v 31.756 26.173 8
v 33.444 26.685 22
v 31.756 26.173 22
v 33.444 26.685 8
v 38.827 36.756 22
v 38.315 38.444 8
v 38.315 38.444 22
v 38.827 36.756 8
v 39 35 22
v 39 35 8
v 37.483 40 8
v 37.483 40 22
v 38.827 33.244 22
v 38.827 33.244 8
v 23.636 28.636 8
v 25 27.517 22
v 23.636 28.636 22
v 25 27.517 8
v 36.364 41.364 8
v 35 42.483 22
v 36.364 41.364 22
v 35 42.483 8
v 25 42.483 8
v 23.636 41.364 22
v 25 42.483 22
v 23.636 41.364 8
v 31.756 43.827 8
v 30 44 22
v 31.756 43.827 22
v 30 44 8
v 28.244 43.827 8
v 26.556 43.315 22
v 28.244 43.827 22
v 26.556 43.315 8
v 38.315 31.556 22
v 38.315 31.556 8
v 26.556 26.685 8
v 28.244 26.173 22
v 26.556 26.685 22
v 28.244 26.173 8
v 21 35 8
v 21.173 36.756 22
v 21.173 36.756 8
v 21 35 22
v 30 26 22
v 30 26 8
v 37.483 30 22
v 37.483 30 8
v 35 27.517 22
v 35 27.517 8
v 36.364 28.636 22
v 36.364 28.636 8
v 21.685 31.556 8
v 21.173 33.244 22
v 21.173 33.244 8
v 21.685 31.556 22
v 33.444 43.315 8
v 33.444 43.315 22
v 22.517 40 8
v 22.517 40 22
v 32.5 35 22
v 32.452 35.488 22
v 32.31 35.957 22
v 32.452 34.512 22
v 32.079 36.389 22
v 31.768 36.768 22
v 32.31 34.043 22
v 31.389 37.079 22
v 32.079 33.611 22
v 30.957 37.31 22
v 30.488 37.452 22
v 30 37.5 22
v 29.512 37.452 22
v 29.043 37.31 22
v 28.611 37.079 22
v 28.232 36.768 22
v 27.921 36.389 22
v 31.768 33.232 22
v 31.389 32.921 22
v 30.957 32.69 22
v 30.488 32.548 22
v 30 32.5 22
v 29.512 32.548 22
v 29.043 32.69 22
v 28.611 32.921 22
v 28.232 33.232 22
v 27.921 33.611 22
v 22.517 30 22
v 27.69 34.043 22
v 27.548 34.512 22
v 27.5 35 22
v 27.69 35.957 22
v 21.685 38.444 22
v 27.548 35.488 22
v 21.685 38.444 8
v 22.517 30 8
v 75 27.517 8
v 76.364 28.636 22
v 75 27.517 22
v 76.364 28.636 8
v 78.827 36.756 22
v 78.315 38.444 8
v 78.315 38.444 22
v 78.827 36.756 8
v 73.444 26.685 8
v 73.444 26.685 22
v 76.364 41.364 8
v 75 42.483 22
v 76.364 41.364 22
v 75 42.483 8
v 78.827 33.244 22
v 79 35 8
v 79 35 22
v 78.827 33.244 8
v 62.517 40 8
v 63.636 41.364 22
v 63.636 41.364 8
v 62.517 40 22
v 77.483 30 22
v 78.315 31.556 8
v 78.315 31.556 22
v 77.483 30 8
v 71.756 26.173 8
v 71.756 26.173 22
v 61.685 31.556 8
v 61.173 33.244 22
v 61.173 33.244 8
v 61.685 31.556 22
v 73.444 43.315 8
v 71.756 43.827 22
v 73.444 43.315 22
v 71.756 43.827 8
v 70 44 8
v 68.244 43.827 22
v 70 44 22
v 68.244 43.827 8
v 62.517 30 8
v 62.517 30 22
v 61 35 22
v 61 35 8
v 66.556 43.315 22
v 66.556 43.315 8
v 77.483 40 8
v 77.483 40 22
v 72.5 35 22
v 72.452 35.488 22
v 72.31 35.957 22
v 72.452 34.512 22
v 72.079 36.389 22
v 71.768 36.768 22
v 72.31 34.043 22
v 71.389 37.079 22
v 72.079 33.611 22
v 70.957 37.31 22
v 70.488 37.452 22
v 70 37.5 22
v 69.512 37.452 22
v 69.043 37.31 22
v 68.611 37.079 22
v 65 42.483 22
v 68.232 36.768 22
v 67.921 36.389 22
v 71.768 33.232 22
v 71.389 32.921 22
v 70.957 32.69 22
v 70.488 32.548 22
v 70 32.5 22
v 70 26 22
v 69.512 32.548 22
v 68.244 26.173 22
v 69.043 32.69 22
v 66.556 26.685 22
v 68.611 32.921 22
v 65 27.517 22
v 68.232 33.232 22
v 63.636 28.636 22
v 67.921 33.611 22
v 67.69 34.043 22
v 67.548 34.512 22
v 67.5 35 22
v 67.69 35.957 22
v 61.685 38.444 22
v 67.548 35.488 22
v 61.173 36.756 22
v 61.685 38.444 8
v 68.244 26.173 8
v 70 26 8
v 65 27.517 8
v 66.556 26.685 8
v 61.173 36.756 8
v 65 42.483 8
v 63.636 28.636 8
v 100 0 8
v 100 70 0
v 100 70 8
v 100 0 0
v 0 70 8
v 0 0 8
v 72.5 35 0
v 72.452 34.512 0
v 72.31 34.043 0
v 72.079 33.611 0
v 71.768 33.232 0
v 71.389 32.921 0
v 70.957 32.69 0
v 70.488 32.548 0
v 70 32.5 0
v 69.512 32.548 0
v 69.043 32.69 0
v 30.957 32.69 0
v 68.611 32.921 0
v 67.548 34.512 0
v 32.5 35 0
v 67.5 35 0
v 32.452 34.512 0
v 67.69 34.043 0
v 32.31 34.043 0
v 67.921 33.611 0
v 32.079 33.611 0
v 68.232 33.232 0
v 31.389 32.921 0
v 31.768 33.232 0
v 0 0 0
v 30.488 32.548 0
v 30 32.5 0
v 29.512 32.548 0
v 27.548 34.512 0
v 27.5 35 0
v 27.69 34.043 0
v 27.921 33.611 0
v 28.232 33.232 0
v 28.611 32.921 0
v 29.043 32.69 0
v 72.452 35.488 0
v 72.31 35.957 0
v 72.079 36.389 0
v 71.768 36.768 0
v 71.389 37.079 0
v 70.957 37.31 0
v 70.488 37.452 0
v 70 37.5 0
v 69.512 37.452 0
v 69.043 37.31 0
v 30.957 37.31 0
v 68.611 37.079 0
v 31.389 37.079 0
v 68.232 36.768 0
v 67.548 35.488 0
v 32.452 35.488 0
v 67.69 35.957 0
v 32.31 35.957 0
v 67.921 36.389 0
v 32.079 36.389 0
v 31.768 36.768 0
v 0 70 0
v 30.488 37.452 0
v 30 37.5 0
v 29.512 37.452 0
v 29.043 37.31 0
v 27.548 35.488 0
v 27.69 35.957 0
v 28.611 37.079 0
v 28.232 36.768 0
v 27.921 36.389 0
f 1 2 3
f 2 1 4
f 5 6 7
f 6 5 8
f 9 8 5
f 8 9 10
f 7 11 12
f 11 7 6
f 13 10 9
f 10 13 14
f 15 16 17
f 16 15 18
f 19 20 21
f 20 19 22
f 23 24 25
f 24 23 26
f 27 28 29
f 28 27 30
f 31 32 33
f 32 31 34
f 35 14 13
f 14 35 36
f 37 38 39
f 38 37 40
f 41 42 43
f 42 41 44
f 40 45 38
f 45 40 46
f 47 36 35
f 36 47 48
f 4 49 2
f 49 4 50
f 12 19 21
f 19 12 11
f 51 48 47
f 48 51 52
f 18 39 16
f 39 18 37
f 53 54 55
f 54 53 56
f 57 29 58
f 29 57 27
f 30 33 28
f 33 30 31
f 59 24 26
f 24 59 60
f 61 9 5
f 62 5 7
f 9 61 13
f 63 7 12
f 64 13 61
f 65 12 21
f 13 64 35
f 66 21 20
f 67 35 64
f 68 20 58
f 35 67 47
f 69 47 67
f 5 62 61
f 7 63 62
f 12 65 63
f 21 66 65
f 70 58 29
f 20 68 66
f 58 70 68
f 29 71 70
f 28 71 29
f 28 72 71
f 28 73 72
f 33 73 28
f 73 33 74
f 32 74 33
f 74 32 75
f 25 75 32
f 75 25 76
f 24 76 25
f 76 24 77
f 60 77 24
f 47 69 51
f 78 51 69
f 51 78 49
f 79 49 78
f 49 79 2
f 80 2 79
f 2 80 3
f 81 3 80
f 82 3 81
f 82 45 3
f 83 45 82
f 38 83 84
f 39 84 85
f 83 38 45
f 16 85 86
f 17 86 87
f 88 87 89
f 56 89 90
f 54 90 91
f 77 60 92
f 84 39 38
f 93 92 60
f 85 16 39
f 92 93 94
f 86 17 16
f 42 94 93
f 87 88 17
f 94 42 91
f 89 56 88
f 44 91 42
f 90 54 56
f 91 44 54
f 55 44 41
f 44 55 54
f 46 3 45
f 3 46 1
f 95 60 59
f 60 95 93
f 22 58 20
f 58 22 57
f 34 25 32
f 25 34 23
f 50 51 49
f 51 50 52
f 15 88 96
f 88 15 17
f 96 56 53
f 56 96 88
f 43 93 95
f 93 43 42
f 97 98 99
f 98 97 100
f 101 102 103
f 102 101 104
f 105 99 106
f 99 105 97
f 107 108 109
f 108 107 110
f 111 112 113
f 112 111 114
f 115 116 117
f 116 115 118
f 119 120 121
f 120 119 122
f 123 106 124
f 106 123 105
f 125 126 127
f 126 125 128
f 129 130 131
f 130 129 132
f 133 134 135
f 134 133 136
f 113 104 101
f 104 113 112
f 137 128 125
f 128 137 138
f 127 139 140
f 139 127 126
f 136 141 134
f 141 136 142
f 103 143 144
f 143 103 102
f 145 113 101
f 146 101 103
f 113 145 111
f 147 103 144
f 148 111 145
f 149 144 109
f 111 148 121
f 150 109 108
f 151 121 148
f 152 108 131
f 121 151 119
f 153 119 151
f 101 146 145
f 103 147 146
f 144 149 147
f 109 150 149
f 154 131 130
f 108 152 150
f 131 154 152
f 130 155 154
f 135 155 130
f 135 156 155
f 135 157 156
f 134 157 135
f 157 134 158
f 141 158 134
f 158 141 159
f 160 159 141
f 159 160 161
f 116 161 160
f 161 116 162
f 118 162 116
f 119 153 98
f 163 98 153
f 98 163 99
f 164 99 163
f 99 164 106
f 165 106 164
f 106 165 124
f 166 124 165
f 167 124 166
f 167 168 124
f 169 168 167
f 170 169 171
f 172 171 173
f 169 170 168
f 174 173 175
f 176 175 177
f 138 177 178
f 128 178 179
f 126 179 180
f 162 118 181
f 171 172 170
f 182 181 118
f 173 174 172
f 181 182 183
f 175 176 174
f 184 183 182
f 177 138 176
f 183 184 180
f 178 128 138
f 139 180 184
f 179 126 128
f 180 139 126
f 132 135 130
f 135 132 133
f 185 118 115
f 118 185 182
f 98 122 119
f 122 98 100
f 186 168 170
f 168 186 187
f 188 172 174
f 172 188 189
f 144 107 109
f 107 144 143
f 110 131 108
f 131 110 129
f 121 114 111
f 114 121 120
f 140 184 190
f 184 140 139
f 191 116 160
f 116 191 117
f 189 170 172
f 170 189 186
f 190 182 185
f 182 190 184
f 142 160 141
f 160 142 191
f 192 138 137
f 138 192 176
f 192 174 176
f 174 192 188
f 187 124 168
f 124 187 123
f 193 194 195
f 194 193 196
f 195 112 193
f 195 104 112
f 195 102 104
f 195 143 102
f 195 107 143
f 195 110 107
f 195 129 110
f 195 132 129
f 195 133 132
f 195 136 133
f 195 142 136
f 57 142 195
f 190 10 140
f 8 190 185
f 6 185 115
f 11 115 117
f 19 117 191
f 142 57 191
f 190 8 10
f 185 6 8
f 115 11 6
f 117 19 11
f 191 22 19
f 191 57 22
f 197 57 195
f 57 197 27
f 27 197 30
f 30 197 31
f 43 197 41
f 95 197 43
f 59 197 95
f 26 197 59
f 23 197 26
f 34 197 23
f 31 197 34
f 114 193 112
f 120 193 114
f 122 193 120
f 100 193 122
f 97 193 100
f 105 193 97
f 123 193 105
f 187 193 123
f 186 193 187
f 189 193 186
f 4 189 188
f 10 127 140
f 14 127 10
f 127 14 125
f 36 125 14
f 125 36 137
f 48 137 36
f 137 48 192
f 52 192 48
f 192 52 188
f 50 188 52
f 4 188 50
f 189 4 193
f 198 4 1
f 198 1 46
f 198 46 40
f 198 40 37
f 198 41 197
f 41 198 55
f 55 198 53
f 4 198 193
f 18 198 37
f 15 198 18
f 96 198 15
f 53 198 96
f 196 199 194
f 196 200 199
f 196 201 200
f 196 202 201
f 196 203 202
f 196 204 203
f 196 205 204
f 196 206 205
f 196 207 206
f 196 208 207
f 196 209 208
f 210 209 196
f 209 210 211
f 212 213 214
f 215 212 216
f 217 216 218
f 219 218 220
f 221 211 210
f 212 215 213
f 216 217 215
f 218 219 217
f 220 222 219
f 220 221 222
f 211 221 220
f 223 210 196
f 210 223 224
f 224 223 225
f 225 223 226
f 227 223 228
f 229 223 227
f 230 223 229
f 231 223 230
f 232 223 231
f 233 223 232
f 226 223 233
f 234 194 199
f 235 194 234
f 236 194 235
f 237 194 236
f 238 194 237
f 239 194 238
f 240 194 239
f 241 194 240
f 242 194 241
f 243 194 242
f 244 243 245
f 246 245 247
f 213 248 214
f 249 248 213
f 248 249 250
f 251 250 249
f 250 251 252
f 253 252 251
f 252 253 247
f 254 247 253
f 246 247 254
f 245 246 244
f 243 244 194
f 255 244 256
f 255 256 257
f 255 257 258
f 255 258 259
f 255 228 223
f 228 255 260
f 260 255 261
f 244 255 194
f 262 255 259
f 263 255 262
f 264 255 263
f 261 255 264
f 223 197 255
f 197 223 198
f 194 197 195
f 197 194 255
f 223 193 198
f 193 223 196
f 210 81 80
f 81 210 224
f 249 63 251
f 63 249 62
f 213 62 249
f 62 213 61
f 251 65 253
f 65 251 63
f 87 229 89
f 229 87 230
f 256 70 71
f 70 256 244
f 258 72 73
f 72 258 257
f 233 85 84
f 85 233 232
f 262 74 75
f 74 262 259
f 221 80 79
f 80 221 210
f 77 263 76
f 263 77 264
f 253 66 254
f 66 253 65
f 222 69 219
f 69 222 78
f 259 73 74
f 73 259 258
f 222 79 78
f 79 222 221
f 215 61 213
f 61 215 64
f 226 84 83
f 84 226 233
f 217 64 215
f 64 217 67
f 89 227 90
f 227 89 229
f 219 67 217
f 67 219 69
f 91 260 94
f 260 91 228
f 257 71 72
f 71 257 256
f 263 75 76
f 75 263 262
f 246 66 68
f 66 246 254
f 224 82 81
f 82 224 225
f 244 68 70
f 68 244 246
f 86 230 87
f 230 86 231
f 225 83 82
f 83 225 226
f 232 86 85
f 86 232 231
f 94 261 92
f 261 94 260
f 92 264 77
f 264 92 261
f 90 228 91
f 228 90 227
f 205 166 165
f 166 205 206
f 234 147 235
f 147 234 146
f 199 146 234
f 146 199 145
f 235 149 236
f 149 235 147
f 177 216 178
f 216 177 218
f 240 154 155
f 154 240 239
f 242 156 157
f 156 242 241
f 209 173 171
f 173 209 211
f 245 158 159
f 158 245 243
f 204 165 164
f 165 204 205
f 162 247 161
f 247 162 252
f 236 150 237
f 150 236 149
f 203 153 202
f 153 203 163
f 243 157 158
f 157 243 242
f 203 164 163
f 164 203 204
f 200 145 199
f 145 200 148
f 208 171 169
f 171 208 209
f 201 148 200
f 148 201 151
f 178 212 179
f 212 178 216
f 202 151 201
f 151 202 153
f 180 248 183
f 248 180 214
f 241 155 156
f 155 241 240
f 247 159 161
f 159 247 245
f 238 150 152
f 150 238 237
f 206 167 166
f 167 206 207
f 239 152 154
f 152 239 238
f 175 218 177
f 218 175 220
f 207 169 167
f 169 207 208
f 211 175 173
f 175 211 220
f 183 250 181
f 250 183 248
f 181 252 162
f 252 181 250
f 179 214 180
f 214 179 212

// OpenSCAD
$fn = 32;

// ----------------------------------------------------------------------
// Drill jig: two_boss jig
// ----------------------------------------------------------------------

// --- parameters (mm) ---
plate_l = 100;            // plate length, X
plate_w = 70;             // plate width, Y
plate_t = 8;              // plate thickness
boss_d = 18;              // guide boss diameter
boss_h = 15;              // boss height above the plate
guide_d = 5;              // guide hole diameter
boss_pitch = 40;          // boss pitch

n_boss = 2;  // guide bosses
boss_x0 = (plate_l - (n_boss - 1) * boss_pitch) / 2;  // first boss X
boss_top = plate_t - 1 + boss_h;  // boss crown height
total_h = boss_top;  // overall height

difference() {
  union() {
  cube([plate_l, plate_w, plate_t]);
  for (i = [0 : n_boss - 1])
    translate([boss_x0 + i * boss_pitch, plate_w / 2, plate_t - 1])
      cylinder(h = boss_h, d = boss_d);
  }
  for (i = [0 : n_boss - 1])
    translate([boss_x0 + i * boss_pitch, plate_w / 2, -1])
      cylinder(h = plate_t + boss_h, d = guide_d);
}
